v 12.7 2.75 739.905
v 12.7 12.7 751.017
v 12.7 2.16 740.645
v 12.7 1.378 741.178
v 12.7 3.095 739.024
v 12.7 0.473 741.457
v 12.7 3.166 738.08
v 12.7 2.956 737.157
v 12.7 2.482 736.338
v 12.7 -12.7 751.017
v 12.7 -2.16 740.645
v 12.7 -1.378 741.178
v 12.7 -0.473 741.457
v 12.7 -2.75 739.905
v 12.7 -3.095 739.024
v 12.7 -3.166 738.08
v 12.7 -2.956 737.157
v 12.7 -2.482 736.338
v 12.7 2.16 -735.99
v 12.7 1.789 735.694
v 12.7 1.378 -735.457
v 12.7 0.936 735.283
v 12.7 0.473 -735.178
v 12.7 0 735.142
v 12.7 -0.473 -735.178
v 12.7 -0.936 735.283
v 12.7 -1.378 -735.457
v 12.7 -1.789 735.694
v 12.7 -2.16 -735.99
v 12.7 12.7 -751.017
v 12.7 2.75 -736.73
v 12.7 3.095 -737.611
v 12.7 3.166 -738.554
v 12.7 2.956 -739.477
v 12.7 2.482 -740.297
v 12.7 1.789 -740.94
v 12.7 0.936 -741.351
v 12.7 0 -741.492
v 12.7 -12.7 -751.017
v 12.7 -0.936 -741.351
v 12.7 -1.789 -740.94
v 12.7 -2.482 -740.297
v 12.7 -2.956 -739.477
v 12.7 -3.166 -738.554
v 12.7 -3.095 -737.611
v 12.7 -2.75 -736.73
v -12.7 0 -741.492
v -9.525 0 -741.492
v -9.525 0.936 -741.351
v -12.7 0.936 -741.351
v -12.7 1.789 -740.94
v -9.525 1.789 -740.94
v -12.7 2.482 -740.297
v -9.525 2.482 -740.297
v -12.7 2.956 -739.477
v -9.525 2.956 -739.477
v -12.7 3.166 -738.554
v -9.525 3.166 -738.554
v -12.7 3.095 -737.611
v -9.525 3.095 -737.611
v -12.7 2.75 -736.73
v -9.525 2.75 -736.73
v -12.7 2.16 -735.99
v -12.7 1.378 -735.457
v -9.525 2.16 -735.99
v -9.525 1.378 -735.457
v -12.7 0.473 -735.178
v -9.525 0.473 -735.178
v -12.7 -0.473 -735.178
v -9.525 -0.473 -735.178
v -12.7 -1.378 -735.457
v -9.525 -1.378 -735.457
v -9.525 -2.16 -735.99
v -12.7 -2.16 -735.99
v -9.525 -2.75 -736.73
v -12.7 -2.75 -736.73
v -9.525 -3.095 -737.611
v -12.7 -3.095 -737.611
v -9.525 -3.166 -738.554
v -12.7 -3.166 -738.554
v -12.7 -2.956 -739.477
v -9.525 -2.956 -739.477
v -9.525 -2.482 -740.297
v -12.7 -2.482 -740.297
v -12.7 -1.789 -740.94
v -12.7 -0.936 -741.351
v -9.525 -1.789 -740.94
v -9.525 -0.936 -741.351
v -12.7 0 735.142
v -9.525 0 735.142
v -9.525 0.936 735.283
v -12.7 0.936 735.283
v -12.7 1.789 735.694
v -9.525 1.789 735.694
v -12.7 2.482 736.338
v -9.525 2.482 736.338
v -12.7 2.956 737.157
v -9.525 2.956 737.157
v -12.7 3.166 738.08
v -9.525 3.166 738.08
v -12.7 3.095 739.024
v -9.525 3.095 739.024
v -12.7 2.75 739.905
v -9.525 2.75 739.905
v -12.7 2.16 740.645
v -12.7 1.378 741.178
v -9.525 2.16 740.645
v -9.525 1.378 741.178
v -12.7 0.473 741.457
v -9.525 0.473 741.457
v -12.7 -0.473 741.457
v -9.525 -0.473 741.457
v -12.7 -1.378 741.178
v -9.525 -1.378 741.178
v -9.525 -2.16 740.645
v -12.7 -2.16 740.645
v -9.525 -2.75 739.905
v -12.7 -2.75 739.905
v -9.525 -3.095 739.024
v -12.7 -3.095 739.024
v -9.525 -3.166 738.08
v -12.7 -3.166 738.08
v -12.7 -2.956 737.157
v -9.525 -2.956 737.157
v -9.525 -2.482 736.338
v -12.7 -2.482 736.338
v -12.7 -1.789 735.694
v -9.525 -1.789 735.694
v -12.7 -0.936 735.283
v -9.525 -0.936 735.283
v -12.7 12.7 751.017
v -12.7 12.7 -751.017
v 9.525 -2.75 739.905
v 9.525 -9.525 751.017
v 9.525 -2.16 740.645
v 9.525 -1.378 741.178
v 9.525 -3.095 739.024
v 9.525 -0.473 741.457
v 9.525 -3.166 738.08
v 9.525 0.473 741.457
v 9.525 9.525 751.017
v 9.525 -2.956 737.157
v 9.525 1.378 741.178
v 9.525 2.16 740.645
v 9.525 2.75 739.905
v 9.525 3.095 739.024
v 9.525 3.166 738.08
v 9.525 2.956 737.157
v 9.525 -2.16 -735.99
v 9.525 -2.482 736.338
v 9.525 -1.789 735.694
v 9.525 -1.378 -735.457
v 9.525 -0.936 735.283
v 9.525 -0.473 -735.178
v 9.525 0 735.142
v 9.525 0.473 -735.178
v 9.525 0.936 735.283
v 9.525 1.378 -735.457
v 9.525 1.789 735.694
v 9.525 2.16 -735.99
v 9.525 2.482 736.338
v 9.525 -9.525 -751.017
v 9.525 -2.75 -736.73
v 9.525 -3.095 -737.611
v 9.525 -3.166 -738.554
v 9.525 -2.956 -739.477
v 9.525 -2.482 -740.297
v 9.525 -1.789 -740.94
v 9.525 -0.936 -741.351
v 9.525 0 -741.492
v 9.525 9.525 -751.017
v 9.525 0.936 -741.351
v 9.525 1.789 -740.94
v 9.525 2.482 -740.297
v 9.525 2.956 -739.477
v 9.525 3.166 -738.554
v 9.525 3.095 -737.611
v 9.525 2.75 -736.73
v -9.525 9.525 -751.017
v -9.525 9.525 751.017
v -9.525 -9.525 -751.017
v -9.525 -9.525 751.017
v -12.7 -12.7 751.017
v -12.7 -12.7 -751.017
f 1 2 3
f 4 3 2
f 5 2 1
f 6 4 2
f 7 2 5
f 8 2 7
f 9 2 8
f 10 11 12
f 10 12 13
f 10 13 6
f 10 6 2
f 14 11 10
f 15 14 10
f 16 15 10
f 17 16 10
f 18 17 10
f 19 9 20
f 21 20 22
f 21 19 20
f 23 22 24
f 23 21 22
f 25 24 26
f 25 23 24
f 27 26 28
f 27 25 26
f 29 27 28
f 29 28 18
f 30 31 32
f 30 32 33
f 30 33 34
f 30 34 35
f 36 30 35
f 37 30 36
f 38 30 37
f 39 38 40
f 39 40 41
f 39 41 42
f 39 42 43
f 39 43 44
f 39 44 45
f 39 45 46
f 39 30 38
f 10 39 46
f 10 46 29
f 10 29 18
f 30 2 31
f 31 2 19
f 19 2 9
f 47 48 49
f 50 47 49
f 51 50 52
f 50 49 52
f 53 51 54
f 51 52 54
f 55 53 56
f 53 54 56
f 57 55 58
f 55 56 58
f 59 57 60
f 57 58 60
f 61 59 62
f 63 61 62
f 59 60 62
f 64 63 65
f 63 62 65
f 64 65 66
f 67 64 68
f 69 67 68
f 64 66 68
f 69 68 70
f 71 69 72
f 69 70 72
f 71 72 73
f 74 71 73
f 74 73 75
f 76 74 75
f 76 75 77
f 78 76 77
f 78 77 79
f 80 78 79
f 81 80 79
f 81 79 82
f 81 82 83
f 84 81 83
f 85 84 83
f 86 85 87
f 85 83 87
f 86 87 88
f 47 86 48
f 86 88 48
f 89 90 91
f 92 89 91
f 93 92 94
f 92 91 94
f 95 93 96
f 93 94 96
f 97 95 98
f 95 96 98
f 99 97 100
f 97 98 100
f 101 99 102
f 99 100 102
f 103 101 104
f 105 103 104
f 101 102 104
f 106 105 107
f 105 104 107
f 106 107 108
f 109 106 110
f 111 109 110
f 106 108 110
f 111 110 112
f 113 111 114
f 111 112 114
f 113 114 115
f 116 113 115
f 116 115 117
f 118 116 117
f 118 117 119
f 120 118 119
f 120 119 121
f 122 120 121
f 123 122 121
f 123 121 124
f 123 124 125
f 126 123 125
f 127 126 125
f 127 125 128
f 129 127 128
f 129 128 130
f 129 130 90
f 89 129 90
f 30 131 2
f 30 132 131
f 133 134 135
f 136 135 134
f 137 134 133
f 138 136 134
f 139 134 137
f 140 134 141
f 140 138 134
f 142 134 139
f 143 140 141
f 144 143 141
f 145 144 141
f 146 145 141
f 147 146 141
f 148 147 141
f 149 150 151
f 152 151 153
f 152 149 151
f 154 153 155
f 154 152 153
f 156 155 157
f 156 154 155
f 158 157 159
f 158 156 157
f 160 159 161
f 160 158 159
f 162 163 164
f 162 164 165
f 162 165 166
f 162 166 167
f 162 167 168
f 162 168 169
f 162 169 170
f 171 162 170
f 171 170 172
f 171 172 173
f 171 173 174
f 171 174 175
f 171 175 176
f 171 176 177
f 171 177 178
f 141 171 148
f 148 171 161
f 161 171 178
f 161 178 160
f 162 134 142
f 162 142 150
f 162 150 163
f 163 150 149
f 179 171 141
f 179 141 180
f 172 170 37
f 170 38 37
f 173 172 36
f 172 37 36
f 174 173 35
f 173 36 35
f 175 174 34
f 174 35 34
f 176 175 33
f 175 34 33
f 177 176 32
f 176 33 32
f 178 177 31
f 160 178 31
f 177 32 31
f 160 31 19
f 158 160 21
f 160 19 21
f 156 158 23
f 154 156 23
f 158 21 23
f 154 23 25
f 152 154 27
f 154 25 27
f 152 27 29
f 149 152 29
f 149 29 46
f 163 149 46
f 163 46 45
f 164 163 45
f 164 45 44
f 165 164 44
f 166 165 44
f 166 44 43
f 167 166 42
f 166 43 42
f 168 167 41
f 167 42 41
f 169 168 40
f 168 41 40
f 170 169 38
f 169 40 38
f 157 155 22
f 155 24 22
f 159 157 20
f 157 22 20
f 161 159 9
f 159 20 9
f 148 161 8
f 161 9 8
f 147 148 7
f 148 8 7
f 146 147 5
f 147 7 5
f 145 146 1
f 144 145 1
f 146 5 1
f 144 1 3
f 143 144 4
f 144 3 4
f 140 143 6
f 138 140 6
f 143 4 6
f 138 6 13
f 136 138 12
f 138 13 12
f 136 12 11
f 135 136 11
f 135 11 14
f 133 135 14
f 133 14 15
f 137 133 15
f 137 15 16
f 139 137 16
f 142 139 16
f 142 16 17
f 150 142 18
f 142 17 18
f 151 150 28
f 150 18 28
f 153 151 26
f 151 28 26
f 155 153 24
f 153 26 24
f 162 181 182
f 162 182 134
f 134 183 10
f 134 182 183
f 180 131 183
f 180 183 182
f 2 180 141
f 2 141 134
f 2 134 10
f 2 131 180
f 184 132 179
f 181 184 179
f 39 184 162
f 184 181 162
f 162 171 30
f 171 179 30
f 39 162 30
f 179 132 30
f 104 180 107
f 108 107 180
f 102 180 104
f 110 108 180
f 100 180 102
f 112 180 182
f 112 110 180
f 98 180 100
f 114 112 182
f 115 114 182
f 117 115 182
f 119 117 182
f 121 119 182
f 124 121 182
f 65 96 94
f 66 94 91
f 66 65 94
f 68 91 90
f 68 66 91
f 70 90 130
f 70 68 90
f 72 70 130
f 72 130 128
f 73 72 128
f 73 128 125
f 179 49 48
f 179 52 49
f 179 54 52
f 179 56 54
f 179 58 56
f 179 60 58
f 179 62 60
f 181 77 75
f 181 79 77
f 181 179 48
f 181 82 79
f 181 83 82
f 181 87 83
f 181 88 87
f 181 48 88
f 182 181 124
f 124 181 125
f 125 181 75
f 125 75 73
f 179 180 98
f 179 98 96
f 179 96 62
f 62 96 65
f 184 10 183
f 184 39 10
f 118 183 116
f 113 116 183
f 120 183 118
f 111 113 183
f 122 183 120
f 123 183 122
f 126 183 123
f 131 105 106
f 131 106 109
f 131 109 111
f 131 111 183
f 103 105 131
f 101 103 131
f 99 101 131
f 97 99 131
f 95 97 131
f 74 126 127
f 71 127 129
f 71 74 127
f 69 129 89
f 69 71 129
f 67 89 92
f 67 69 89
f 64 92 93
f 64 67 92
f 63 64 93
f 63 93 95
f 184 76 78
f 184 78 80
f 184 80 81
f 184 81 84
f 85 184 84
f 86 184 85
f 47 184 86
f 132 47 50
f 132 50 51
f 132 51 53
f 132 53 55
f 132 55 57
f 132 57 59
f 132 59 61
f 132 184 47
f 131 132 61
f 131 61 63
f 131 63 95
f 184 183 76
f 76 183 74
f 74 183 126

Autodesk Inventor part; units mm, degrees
ref_plane "YZ Plane" through (0, 0, 0) normal (1, 0, 0) x (0, 1, 0)
ref_plane "XZ Plane" through (0, 0, 0) normal (0, 1, 0) x (-1, 0, 0)
ref_plane "XY Plane" through (0, 0, 0) normal (0, 0, 1) x (1, 0, 0)
sketch "Sketch1" plane through (0, 0, 0) normal (0, 0, 1) x (1, 0, 0)
  line L0 (-12.7, 12.7) -> (12.7, 12.7)
  line L1 (12.7, 12.7) -> (12.7, -12.7)
  line L2 (12.7, -12.7) -> (-12.7, -12.7)
  line L3 (-12.7, -12.7) -> (-12.7, 12.7)
  line L4 (0, 17.78) -> (0, -17.78) projected
  line L5 (-17.78, 0) -> (17.78, 0) projected
  line L6 (9.525, 9.525) -> (-9.525, 9.525)
  line L7 (-9.525, 9.525) -> (-9.525, -9.525)
  line L8 (-9.525, -9.525) -> (9.525, -9.525)
  line L9 (9.525, -9.525) -> (9.525, 9.525)
  point P0 (0, 0)
  dimension "d0" = 25.4
  dimension "d1" = 3.175
extrude "Extrusion1" add sketch "Sketch1" along normal mid plane 1502.0343 contours L0 L4 L6 L7 L5 L3 | L0 L1 L5 L9 L6 L4 | L5 L7 L8 L4 L2 L3 | L1 L2 L4 L8 L9 L5
sketch "Sketch2" plane through (12.7, 12.7, 751.0172) normal (1, 0, 0) x (0, 0, -1)
  line L0 (-300.4069, -12.7) -> (1802.4412, -12.7) projected
  line L1 (751.0172, -30.48) -> (751.0172, 5.08) projected
  circle A0 centre (12.7, -12.7) radius 3.175
  circle A1 centre (1489.3343, -12.7) radius 3.175
  point P0 (751.0172, -12.7)
  dimension "d4" = 1476.6343
  dimension "d5" = 6.35
extrude "Extrusion2" cut sketch "Sketch2" against normal up to surface (25.4 mm away)
equation "\"d2\" = Length"
equation "\"d6\" = Length"
equation "\"Length\" = 1502.034303"
properties part number "NTowerSupport" material "Aluminum 6061"
